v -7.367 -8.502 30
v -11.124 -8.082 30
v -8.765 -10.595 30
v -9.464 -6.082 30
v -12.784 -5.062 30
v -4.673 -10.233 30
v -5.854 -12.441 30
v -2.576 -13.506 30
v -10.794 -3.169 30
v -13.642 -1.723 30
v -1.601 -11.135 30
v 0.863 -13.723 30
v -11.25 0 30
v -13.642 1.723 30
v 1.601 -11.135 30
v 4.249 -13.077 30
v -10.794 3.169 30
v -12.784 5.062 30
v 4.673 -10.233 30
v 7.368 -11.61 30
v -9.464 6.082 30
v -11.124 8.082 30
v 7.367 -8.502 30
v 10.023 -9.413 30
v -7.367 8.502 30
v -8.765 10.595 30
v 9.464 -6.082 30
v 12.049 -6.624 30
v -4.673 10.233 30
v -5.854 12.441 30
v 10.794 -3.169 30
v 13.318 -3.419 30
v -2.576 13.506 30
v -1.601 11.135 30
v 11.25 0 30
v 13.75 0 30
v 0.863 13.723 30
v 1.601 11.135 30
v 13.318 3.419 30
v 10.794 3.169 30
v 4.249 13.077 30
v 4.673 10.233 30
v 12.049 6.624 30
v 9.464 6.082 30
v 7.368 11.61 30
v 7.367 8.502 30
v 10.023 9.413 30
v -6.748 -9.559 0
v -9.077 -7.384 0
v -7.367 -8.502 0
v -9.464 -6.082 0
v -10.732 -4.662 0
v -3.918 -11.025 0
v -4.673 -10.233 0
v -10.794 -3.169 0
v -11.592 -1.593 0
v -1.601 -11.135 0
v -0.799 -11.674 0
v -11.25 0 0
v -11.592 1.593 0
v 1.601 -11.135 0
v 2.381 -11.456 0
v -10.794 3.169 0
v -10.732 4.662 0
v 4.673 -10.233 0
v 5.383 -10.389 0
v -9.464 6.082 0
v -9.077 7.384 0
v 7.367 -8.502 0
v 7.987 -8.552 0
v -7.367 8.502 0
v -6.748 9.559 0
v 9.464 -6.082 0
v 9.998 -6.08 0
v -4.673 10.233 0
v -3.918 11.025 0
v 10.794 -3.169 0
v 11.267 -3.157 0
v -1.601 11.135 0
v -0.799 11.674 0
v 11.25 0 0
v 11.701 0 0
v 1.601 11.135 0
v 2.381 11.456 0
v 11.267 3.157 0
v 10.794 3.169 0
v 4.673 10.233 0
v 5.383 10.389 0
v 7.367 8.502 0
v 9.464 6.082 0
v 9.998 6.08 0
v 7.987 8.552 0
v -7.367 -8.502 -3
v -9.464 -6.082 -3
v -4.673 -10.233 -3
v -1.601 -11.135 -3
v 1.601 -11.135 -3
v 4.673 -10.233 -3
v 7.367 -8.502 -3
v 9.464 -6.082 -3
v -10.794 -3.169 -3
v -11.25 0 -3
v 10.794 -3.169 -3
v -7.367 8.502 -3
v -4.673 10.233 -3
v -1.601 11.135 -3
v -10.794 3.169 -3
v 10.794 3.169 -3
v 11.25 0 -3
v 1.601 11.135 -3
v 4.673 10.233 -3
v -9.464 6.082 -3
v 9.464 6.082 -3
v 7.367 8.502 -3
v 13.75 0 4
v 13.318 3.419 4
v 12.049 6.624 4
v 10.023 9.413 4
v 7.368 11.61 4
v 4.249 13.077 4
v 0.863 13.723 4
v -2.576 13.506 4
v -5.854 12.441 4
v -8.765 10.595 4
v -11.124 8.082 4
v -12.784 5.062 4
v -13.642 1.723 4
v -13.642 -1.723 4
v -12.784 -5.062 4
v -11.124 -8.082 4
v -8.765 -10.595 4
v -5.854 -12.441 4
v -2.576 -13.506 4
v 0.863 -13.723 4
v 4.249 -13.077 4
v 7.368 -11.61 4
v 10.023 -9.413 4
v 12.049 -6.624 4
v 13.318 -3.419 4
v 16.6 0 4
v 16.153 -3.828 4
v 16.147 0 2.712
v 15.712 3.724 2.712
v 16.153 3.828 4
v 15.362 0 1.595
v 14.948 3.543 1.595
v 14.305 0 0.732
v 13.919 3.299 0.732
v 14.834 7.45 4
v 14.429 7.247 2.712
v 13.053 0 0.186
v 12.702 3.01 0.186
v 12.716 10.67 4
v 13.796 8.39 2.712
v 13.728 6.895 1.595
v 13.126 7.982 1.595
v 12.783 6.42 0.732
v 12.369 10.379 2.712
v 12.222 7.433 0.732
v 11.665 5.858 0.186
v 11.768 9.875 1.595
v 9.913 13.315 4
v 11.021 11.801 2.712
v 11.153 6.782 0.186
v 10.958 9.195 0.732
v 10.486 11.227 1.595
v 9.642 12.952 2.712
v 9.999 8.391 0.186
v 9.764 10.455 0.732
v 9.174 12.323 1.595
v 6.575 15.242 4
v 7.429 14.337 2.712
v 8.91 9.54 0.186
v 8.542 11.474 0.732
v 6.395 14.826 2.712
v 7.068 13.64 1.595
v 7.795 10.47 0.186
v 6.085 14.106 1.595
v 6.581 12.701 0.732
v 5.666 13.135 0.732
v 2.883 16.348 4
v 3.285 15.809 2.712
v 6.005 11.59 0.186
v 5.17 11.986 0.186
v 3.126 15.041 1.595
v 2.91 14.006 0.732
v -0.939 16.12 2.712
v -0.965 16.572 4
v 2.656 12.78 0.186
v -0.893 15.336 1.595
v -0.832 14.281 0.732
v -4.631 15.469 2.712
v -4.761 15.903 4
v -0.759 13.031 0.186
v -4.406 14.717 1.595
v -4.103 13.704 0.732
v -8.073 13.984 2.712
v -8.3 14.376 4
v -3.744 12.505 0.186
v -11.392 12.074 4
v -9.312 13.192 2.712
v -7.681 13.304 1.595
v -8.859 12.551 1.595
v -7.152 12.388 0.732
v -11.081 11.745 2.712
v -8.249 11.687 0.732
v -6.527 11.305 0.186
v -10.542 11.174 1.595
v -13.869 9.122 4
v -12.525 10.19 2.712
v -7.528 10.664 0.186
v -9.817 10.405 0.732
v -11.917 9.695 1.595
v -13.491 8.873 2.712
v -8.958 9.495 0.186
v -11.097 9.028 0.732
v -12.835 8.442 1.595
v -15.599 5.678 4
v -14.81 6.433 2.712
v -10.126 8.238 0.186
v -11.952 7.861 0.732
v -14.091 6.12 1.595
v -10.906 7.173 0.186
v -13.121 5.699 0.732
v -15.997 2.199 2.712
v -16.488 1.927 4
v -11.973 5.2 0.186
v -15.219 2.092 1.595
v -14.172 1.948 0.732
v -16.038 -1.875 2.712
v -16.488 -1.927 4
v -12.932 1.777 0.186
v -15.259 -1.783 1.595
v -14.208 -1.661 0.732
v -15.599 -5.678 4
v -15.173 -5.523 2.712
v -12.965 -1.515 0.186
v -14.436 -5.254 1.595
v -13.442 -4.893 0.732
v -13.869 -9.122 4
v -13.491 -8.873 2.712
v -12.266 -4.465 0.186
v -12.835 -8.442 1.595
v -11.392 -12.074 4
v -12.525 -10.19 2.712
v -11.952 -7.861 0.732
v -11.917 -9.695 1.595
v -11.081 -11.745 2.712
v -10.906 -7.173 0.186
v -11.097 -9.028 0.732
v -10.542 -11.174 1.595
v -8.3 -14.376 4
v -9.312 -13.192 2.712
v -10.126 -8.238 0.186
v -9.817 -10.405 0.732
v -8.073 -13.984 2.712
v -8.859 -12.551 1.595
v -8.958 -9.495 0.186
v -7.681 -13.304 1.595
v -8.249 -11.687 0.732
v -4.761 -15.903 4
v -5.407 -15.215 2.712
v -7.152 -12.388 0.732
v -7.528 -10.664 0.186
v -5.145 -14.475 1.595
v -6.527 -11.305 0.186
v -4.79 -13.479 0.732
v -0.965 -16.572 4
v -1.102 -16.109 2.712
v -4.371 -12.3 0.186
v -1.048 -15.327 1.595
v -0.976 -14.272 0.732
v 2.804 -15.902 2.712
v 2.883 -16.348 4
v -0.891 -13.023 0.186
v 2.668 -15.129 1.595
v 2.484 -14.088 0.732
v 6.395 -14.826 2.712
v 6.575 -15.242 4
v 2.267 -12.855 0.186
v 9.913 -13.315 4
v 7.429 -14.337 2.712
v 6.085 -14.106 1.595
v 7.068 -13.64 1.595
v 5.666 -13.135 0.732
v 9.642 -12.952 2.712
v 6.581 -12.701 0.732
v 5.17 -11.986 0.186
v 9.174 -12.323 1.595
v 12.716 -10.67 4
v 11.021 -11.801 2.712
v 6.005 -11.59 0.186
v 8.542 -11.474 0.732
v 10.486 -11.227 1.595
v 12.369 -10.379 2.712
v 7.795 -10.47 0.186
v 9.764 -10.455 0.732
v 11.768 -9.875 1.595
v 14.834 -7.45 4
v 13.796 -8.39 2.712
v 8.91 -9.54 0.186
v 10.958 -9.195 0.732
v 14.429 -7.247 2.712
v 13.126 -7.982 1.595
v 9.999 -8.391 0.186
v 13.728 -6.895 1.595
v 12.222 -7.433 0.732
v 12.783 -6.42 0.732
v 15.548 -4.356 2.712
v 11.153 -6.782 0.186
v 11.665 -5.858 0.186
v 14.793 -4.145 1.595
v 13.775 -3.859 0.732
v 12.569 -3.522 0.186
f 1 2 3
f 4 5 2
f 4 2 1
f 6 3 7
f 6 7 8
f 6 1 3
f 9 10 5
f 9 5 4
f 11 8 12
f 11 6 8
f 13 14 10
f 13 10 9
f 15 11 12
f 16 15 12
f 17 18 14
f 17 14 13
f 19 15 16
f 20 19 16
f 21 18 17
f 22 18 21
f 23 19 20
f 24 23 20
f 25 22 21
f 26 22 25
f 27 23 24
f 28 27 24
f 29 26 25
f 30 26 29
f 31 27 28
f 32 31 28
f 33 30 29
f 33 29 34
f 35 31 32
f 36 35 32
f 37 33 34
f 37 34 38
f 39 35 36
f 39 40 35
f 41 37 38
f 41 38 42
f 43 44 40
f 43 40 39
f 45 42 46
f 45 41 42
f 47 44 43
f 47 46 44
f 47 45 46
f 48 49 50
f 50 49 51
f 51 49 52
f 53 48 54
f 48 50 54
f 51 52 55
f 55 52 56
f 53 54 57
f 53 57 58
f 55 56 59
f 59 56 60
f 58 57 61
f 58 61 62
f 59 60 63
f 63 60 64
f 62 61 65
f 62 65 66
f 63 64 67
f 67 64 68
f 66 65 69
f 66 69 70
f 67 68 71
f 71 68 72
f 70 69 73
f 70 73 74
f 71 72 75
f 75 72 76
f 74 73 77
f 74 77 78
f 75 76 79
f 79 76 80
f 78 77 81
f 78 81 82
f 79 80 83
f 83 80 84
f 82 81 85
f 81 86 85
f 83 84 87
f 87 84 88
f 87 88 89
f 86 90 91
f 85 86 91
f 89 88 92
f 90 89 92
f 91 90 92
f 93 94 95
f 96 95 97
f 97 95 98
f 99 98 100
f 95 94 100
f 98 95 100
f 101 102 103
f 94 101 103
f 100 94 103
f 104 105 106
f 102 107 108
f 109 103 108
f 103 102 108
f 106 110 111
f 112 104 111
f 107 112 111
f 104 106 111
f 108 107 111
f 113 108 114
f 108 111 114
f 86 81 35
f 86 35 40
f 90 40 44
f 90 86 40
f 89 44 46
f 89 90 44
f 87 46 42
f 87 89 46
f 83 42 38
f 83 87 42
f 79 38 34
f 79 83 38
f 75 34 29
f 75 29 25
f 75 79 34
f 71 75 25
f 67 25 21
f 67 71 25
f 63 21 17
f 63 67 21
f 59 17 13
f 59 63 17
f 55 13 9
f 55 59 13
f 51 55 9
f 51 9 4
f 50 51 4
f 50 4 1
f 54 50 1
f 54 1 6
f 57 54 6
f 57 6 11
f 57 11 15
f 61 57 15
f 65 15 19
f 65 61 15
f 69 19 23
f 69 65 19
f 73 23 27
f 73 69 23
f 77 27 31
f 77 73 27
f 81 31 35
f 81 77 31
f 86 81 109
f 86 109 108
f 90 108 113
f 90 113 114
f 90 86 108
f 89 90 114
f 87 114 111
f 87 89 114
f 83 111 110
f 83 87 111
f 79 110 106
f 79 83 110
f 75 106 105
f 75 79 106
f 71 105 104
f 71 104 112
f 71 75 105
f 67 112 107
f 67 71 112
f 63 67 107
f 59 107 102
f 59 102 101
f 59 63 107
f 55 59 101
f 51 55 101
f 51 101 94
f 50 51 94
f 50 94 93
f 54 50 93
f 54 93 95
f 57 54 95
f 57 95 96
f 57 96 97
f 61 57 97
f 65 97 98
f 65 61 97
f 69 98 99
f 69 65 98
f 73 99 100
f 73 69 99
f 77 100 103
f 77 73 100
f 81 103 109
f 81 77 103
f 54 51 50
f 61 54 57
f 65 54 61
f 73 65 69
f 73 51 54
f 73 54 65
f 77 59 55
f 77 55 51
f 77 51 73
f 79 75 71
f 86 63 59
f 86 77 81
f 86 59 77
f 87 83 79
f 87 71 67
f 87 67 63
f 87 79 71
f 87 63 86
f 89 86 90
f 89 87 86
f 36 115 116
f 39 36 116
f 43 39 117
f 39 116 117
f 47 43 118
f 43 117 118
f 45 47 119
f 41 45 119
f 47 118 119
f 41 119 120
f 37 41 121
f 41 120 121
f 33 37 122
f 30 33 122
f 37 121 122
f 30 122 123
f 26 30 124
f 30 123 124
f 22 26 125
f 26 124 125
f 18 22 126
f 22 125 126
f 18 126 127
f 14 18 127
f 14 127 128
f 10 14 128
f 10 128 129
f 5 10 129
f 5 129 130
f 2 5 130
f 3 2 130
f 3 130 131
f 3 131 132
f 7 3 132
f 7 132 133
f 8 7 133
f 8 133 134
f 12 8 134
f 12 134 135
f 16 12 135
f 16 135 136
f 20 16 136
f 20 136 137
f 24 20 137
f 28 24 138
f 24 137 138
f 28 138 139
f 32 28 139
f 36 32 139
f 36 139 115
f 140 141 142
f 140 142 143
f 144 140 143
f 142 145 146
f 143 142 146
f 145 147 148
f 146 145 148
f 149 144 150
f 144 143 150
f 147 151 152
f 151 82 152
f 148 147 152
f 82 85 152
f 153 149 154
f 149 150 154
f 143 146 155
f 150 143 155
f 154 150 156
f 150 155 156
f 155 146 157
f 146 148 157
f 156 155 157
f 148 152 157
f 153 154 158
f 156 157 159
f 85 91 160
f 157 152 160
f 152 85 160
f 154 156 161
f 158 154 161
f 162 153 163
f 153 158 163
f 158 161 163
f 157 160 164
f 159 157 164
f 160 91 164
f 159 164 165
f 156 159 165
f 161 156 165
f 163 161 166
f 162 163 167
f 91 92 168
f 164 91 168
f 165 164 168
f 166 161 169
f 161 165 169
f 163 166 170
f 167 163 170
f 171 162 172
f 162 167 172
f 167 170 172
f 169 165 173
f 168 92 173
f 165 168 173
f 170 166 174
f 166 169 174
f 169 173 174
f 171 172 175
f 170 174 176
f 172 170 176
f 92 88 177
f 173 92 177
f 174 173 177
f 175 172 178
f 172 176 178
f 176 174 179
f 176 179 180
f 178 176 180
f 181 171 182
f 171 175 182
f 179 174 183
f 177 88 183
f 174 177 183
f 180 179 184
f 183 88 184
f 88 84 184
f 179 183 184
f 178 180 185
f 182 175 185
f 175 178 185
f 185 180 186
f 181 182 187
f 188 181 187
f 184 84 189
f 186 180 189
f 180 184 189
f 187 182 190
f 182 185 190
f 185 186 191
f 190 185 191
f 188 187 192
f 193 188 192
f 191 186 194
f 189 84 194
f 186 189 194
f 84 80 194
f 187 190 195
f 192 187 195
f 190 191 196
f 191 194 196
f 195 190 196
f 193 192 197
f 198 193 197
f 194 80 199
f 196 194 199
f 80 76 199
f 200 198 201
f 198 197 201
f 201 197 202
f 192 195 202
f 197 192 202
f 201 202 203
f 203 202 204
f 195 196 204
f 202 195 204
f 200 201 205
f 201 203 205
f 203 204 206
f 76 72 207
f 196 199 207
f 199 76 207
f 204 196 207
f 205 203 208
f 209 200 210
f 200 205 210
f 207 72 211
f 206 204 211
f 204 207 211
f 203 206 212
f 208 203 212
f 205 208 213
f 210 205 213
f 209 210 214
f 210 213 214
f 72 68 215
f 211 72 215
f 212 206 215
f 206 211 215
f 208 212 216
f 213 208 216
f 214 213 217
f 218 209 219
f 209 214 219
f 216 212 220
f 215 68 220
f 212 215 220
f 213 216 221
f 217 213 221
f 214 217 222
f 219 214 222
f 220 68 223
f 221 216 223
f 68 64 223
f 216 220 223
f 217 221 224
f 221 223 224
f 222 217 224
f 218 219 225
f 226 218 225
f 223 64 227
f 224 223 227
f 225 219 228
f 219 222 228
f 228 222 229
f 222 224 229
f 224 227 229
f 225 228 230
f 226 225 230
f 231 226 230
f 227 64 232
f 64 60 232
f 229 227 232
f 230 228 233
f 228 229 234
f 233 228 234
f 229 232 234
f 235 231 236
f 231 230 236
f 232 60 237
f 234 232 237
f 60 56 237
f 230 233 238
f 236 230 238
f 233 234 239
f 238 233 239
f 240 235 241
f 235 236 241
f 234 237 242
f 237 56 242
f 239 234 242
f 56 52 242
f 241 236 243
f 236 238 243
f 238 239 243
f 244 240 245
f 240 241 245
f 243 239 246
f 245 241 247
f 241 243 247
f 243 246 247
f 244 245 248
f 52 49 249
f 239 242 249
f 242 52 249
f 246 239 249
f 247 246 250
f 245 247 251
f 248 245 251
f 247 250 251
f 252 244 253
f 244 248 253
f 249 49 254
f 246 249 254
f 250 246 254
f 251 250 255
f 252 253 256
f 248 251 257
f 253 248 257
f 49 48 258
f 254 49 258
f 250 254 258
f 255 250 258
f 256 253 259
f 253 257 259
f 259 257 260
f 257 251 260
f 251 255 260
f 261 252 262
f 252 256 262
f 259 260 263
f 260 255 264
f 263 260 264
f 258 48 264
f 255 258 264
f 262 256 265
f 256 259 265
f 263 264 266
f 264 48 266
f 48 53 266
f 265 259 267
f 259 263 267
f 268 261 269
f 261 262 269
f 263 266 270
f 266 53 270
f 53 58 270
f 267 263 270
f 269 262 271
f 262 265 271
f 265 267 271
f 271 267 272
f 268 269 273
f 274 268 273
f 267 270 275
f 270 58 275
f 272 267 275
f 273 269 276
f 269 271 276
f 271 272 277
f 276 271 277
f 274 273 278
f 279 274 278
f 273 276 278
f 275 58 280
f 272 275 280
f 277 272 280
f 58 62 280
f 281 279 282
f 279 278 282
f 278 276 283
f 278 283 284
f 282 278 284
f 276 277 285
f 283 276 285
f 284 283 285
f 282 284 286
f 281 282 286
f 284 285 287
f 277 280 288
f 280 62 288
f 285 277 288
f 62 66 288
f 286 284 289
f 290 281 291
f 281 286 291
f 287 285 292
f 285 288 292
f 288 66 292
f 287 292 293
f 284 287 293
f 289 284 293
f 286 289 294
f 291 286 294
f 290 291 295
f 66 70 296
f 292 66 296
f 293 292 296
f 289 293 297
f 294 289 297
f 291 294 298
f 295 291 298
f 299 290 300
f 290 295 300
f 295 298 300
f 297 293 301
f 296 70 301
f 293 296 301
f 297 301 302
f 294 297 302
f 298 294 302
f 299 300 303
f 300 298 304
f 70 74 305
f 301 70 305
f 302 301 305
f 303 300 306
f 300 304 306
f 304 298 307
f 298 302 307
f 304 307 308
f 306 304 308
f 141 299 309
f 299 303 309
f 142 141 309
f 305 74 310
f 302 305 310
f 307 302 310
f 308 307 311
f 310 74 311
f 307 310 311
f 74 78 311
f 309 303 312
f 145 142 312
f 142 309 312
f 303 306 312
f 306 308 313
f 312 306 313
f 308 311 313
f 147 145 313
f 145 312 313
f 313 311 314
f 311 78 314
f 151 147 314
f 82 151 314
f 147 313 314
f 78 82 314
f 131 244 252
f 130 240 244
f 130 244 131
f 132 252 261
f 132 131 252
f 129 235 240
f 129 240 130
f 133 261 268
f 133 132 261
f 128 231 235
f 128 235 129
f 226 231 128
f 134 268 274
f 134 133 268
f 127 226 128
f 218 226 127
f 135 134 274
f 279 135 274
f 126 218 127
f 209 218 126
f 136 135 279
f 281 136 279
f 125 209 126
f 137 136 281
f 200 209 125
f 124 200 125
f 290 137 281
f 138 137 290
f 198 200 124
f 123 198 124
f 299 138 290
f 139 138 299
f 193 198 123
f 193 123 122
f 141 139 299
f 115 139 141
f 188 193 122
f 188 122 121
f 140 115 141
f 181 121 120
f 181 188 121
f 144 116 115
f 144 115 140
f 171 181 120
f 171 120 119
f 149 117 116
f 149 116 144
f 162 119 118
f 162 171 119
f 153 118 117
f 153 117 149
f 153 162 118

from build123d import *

# Parameters (mm, degrees)
F0_R     = 13.75
F0_R_2   = 11.25
F1_DEPTH = 30
F0_R_3   = 16.6
F2_DEPTH = 4
F4_DEPTH = 3


# Not quite as in the source:
# - a fillet or chamfer that OpenCascade refuses, or shapes differently, is made with other operations: its cross-section is extruded or revolved along the edge and cut away or added


with BuildPart() as f1:
    # F0 (on Top) → F1 (new body)
    with BuildSketch(Plane.XY):
        Circle(F0_R)
        Circle(F0_R_2, mode=Mode.SUBTRACT)
    extrude(amount=F1_DEPTH)

    # F0 (on Top) → F2 (join)
    with BuildSketch(Plane.XY):
        Circle(F0_R_3)
        Circle(F0_R, mode=Mode.SUBTRACT)
    extrude(amount=F2_DEPTH)

    # F3: fillet of radius 5 on 1 edges, made by hand

    # F3_s1 → F3_t2 (revolve, cut)
    with BuildSketch(Plane.XZ):
        with BuildLine():
            ThreePointArc((16.6, 4), (14.8632981746, 1.1270166538), (11.7010205144, 0))
            Line((11.7010205144, 0), (16.6, 0))
            Line((16.6, 0), (16.6, 4))
        make_face()
    revolve(axis=Axis((0, 0, 0), (0, 0, 1)), mode=Mode.SUBTRACT)


with BuildPart() as f4:
    # F0 (on Top) → F4 (new body)
    with BuildSketch(Plane.XY):
        Circle(F0_R_2)
    extrude(amount=-F4_DEPTH)


solid = Compound([f1.part, f4.part])
